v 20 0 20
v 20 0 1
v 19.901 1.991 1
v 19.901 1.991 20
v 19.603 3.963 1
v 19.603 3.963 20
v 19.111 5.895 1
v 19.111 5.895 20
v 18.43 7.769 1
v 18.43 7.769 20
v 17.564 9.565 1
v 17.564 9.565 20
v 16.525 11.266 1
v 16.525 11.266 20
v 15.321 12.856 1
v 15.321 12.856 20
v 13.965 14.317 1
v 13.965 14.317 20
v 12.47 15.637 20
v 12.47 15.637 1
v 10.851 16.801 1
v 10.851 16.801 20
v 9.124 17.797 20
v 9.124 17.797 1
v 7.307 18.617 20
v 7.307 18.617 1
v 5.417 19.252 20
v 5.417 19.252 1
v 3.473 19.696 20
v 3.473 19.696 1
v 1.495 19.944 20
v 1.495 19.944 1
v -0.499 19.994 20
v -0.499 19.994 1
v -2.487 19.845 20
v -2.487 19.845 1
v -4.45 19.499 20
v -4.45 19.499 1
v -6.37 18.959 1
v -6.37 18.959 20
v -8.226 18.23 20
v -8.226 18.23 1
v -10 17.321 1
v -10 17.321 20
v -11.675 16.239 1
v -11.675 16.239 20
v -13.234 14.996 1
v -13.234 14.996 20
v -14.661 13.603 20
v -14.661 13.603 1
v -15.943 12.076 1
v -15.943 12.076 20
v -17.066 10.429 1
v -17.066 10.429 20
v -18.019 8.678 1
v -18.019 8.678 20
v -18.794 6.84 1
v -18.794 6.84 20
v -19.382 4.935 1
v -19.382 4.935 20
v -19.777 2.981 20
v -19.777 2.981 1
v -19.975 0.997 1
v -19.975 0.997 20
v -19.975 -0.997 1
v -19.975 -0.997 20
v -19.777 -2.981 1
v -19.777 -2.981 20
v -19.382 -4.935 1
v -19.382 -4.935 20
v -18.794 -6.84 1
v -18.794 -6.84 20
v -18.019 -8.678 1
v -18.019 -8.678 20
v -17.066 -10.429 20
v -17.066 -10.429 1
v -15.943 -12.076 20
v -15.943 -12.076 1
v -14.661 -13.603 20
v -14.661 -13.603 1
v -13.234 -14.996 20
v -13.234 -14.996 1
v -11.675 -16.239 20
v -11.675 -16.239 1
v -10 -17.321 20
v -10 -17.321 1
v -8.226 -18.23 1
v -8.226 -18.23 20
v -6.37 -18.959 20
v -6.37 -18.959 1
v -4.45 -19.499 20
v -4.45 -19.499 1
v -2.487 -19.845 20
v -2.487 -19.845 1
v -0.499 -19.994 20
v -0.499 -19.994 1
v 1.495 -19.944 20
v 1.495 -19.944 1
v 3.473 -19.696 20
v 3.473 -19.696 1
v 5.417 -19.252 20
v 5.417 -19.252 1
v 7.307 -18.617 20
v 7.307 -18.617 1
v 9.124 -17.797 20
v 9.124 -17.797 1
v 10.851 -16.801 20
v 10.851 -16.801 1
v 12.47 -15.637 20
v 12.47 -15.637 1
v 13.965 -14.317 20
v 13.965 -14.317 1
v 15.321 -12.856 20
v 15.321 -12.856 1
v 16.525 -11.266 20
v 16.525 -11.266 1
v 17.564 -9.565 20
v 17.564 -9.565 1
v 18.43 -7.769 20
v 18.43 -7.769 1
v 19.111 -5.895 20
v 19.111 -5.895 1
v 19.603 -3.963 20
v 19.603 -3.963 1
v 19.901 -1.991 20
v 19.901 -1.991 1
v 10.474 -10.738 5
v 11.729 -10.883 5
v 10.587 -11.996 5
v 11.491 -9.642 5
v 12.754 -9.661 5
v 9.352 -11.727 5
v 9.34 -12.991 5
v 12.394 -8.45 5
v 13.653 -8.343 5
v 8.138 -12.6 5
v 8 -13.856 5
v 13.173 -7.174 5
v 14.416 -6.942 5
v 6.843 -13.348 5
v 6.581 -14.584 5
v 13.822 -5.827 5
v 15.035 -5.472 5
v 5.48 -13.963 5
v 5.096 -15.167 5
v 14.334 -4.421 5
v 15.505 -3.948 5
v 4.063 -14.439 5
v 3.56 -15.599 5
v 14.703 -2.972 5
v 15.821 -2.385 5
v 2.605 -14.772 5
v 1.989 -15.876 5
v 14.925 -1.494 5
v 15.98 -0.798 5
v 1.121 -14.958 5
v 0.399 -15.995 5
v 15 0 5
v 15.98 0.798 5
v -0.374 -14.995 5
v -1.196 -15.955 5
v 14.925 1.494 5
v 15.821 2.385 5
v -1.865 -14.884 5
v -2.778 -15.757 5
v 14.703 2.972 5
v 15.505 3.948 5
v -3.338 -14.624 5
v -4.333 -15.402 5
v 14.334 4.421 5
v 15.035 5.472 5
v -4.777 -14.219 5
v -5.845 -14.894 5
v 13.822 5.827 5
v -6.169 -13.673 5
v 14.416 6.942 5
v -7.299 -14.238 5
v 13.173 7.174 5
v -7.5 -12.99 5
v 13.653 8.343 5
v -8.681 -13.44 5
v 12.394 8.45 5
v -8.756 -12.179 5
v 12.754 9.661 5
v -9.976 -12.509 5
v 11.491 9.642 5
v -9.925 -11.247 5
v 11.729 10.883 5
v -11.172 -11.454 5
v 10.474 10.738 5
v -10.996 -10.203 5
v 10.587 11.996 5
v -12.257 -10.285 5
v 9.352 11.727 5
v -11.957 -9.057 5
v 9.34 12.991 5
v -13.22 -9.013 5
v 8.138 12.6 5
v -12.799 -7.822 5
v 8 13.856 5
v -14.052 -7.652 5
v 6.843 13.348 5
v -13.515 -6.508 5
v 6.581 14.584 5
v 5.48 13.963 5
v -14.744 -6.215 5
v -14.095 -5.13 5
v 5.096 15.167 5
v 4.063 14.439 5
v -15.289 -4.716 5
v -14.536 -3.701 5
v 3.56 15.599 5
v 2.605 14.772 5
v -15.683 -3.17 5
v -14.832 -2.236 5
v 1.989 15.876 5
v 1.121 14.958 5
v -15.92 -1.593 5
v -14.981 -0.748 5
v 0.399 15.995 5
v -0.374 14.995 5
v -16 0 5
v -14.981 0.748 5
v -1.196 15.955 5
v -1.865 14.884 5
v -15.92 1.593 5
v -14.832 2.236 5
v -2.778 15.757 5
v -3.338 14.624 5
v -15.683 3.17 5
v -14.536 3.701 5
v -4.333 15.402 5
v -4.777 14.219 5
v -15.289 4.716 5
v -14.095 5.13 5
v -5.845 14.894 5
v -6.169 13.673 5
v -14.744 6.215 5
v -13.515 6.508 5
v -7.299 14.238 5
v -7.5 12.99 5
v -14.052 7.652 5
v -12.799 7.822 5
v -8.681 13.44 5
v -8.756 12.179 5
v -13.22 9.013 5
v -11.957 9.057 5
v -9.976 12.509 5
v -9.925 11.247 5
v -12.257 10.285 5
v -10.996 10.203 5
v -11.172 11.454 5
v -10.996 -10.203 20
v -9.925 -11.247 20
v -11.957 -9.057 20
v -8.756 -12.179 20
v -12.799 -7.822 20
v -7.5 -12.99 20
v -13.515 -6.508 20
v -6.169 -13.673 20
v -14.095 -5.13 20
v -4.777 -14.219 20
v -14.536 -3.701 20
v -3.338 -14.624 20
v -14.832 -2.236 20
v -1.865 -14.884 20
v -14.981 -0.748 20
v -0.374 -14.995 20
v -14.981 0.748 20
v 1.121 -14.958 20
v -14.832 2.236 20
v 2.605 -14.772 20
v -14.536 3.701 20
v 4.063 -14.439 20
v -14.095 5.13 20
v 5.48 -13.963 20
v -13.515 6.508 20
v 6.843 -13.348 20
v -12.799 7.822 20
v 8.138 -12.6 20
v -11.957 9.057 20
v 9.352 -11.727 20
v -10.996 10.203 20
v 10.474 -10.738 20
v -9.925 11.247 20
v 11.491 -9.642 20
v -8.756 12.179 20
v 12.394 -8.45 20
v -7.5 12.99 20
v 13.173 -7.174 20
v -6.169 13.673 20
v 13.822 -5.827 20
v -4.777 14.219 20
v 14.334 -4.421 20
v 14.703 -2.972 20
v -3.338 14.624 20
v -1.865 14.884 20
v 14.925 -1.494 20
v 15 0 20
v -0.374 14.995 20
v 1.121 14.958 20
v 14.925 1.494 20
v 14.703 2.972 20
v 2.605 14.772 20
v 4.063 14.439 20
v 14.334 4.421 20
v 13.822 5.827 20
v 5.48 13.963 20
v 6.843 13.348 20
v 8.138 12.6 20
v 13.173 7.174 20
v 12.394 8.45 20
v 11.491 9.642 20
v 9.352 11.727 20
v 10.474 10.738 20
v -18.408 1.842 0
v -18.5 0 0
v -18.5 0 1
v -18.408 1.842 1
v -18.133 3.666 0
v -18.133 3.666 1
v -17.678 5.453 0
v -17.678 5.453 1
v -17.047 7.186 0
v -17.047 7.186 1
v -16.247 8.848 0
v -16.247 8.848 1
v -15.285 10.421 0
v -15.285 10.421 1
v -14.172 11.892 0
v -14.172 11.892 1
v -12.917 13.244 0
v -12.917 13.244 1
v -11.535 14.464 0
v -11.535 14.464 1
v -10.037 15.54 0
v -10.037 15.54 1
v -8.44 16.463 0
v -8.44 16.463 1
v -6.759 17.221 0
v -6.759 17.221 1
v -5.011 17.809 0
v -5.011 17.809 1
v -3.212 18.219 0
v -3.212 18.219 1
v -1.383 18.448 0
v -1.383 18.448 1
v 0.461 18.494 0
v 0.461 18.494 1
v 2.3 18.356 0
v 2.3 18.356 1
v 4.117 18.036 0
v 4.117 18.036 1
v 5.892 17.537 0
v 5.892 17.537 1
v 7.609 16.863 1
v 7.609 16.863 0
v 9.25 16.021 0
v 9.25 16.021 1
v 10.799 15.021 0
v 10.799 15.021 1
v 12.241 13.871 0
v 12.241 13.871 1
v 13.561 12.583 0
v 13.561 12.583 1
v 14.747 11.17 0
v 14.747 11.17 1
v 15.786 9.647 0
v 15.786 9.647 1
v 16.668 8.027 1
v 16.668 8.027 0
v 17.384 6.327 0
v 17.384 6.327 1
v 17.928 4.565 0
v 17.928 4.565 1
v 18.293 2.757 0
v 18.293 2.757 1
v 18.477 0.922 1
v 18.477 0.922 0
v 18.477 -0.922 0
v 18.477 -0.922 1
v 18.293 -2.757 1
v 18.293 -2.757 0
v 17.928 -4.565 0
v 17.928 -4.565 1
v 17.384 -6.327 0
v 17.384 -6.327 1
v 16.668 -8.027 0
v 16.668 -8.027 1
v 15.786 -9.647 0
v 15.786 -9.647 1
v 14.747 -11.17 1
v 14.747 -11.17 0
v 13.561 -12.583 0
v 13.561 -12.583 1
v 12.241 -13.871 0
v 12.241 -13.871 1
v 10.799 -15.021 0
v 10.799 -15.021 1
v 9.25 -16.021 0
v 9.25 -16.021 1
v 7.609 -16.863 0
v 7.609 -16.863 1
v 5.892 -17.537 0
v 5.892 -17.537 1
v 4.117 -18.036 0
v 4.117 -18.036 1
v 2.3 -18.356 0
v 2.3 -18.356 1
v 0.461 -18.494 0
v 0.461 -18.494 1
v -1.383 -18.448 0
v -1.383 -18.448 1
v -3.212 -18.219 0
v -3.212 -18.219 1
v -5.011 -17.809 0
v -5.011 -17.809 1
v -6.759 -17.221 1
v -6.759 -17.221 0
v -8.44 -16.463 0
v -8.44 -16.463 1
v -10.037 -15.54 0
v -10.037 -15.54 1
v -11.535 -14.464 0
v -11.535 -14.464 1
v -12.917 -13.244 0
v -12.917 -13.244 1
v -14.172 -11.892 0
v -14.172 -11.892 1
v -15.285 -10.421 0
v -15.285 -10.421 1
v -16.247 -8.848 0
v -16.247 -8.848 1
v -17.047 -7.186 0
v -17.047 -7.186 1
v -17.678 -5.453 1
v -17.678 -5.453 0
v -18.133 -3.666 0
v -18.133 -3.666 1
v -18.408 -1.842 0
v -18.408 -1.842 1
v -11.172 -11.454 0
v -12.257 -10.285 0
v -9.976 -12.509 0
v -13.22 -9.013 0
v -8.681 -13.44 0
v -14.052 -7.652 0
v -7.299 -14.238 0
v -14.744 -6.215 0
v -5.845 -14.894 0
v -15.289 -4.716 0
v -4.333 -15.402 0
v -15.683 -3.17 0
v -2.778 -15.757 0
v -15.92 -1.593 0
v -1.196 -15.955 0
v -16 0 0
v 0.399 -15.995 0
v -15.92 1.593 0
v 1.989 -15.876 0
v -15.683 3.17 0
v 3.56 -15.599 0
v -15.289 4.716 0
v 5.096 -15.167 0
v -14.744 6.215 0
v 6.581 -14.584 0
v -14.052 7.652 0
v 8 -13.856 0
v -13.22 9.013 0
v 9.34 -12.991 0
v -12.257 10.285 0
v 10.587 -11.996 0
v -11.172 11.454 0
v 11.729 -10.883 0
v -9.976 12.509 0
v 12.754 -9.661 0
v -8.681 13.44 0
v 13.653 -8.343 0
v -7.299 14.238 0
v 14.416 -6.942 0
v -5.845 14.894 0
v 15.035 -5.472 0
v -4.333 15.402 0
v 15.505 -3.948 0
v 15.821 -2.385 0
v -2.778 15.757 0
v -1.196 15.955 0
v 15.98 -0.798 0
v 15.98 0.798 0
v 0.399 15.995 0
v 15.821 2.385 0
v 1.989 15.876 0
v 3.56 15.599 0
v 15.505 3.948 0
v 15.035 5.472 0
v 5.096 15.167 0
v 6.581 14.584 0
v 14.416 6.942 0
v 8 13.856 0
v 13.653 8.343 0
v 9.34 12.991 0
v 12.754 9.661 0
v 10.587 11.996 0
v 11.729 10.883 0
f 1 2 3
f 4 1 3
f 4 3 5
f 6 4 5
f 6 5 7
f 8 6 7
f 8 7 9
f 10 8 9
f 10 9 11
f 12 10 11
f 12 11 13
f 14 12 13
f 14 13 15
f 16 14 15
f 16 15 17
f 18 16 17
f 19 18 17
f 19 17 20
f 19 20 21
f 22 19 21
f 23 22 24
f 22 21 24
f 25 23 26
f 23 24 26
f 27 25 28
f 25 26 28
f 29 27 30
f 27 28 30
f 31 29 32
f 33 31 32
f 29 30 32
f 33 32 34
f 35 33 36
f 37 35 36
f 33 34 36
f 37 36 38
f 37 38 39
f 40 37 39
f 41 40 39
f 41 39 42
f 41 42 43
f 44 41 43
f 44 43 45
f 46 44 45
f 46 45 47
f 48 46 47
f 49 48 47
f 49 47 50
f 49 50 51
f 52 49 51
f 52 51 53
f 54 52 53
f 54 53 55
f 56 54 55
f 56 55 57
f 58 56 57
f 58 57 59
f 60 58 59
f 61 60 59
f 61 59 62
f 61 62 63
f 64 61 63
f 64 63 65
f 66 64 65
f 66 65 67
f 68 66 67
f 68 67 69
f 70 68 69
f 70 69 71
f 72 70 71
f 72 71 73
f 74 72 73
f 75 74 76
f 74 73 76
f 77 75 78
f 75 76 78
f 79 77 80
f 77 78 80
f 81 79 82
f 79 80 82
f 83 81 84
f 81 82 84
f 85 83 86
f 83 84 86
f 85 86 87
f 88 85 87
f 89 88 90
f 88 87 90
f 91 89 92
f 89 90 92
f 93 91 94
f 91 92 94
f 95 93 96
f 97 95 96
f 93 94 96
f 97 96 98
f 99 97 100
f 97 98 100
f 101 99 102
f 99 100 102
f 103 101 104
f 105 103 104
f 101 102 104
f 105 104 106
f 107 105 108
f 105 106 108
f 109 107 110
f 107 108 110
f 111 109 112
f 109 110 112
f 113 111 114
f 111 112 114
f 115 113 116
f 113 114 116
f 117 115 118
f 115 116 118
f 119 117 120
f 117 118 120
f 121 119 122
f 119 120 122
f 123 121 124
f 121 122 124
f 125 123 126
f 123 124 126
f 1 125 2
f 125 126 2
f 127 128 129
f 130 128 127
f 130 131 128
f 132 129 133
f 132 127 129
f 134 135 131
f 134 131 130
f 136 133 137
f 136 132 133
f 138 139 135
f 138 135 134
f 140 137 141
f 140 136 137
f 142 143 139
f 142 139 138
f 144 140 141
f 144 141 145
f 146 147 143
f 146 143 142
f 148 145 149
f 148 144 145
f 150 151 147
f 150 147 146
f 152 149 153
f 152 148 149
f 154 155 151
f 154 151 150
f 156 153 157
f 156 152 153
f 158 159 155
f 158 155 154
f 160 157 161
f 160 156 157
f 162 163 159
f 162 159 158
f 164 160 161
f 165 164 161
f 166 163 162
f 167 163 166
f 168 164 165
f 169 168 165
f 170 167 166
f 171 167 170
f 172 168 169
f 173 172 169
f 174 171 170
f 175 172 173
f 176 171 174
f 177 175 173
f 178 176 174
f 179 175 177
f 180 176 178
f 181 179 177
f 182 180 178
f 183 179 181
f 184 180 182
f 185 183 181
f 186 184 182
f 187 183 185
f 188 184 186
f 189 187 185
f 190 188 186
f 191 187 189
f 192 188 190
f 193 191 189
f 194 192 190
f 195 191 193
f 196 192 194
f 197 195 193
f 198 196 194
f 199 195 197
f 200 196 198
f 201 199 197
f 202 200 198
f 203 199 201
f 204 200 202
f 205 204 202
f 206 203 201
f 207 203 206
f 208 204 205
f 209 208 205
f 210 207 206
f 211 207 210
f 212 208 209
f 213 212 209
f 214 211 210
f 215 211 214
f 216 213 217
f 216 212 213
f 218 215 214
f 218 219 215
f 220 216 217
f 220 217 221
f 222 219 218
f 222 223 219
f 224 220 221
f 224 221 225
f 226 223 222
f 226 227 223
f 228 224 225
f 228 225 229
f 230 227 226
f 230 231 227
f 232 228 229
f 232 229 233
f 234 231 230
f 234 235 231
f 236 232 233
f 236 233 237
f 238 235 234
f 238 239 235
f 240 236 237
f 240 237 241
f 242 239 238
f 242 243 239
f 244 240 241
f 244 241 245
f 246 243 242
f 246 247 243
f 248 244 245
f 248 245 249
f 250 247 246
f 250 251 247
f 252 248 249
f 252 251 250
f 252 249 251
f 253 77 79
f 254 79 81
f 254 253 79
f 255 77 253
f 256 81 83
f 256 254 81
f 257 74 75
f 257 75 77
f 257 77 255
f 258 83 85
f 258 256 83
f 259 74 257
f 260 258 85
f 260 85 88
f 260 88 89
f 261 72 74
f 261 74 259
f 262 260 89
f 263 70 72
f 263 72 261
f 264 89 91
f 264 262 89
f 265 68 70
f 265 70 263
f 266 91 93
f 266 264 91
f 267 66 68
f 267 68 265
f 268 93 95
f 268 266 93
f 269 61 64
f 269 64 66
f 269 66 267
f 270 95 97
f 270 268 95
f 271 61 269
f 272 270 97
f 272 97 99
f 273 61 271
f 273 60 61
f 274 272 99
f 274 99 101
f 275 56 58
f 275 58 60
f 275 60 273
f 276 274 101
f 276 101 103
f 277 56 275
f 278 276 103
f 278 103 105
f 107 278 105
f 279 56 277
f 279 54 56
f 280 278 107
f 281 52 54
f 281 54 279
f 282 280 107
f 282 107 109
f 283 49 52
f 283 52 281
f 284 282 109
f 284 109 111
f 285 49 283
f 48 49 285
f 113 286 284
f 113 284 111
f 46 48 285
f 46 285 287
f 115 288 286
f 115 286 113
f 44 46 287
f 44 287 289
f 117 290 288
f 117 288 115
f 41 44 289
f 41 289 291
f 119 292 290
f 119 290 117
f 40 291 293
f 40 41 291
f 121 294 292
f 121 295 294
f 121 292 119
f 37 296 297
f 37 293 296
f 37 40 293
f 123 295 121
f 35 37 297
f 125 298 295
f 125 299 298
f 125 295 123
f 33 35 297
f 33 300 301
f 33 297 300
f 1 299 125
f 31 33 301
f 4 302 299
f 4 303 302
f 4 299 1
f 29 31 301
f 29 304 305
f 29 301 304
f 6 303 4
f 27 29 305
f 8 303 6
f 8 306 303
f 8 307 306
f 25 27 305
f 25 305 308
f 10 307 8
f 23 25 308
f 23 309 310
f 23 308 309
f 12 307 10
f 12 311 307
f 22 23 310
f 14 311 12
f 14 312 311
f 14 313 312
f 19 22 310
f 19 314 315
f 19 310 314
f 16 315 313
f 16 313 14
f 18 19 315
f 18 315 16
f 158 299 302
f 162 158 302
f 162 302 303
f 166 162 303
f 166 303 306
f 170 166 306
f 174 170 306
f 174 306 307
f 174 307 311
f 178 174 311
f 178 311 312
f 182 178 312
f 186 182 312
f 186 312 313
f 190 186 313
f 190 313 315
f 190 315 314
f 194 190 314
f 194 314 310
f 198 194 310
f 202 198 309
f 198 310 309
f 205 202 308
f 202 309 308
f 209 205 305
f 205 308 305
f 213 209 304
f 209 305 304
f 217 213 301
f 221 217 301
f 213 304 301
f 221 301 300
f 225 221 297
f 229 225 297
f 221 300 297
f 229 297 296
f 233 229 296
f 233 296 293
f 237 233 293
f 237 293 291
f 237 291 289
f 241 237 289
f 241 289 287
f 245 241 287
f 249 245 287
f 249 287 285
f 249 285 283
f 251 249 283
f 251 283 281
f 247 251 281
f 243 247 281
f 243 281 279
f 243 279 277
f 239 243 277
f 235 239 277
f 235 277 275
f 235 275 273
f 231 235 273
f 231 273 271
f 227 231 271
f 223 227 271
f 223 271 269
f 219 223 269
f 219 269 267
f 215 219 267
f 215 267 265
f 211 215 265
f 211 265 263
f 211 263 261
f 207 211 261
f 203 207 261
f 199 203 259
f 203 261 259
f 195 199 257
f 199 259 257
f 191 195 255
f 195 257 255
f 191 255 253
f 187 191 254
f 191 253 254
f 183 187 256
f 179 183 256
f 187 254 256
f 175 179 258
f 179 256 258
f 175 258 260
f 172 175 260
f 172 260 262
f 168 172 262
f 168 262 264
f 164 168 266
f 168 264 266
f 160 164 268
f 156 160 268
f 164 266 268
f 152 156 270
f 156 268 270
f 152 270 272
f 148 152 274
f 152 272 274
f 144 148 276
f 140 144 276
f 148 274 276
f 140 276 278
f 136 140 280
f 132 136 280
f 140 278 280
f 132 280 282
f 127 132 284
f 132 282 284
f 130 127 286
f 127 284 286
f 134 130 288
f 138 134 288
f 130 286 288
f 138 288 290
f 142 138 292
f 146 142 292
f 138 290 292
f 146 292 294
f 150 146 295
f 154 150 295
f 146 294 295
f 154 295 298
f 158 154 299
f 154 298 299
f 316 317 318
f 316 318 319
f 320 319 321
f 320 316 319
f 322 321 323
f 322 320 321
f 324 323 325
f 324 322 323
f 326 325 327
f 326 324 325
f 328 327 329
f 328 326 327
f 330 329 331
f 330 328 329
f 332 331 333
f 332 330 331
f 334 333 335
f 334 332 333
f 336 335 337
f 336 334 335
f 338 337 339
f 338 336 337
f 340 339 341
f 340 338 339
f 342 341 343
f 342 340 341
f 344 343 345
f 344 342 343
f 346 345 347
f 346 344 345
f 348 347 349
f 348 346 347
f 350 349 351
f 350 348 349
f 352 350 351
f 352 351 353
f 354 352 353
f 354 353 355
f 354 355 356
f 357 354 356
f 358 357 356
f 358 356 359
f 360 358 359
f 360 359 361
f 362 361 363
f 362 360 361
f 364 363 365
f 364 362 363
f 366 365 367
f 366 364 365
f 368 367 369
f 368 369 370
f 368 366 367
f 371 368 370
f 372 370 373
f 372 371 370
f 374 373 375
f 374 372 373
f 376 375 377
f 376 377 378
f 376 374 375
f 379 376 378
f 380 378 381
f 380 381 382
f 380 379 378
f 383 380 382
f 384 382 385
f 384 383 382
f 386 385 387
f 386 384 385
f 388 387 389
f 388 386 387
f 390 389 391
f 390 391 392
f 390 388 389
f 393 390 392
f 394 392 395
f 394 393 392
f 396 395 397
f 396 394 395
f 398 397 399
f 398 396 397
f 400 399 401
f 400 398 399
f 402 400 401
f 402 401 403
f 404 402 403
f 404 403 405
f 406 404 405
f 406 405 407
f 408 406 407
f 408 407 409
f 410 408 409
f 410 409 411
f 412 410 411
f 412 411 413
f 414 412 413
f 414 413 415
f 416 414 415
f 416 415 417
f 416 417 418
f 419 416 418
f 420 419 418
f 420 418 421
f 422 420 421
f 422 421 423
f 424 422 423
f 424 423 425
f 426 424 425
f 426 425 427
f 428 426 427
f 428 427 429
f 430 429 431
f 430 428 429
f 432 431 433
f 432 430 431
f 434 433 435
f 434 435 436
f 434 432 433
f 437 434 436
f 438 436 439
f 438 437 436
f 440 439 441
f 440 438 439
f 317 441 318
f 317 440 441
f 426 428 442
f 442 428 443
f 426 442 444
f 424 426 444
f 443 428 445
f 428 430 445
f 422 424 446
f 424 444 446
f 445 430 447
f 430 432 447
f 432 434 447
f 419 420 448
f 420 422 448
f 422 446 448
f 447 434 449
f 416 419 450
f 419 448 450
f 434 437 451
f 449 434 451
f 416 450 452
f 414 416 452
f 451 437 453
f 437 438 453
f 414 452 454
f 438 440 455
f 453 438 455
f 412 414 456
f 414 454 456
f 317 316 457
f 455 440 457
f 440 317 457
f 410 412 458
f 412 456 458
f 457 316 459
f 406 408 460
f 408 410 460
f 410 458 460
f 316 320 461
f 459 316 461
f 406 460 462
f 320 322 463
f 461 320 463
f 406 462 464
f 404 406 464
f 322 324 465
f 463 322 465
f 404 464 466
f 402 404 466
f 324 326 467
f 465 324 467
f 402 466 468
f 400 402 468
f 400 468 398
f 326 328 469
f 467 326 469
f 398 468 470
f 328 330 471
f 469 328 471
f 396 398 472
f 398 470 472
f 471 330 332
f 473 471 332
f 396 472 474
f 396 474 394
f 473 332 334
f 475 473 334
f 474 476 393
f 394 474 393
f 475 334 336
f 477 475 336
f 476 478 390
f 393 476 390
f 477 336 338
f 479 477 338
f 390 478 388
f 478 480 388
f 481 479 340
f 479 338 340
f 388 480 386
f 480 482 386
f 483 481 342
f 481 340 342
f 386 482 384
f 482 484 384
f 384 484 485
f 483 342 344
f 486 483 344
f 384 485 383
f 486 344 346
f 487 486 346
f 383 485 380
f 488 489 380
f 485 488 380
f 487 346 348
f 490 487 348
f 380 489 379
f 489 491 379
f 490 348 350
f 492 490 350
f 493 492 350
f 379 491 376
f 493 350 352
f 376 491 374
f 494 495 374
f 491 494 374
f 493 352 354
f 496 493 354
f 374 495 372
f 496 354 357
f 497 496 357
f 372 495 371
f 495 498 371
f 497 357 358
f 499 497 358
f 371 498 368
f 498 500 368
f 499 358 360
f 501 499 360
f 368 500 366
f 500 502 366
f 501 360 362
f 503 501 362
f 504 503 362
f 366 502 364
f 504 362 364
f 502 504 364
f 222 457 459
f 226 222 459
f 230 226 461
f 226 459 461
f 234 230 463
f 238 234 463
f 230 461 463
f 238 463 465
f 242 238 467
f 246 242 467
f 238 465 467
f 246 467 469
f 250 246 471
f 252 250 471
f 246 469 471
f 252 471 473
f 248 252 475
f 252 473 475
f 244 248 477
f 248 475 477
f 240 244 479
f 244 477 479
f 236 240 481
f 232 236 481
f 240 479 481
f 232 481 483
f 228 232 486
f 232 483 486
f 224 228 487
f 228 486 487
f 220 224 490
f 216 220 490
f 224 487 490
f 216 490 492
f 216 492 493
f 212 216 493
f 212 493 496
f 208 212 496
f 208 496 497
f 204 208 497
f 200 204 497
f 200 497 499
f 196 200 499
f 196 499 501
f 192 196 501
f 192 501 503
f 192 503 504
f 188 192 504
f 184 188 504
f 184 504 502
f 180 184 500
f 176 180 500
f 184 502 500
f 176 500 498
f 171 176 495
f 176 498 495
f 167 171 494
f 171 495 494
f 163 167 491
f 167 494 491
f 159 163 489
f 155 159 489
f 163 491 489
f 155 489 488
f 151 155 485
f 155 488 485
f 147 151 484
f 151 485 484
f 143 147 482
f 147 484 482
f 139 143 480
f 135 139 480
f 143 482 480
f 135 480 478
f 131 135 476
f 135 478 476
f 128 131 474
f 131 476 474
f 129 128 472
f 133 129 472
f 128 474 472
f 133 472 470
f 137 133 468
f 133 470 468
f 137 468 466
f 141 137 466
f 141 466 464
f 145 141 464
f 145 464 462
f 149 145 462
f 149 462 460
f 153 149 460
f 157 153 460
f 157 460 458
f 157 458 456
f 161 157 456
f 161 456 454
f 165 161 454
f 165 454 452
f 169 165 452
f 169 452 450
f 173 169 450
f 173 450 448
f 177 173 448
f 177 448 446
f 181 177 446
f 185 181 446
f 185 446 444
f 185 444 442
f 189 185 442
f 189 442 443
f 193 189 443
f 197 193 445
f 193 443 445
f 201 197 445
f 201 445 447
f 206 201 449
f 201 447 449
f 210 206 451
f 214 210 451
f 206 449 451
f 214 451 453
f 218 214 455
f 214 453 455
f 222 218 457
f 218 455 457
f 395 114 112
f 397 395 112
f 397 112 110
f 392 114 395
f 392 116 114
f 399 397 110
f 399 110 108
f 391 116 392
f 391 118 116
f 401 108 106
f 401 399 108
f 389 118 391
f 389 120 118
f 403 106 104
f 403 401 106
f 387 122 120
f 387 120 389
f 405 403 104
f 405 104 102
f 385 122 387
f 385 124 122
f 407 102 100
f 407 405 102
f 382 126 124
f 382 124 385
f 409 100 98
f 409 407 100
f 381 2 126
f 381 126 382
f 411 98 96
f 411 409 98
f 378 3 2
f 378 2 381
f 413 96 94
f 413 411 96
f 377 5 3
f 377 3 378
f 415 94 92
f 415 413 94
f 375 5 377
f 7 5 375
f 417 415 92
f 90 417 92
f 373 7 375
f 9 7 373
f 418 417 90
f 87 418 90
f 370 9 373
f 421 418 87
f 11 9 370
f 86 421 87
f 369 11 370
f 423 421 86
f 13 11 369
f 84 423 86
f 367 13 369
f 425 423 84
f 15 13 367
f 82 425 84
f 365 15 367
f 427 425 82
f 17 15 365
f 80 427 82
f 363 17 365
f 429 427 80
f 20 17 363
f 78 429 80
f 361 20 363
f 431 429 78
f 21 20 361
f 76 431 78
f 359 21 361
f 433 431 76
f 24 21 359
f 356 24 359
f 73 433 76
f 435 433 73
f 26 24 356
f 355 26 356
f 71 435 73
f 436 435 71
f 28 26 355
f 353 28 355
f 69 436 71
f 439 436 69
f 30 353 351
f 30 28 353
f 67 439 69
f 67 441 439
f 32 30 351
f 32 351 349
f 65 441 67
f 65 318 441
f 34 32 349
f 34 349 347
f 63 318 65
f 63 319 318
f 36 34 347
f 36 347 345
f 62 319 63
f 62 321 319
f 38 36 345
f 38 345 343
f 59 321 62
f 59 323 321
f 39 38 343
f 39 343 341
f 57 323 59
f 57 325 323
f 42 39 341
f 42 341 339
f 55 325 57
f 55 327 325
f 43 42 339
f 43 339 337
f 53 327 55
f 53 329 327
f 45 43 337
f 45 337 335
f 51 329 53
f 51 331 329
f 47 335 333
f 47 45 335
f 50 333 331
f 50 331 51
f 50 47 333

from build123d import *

# Parameters (mm, degrees)
SKETCH_1_R          = 20
EXTRUDE_1_DEPTH     = 20
SKETCH_4_R          = 20
SKETCH_4_R_2        = 18.5
CUT_EXTRUDE_3_DEPTH = 1
SKETCH_3_R          = 16
CUT_EXTRUDE_2_DEPTH = 5
SKETCH_6_R          = 15
CUT_EXTRUDE_4_DEPTH = 21


with BuildPart() as part:
    # ｽｹｯﾁ1 → ﾎﾞｽ - 押し出し1 (new body)
    with BuildSketch(Plane.XY):
        Circle(SKETCH_1_R)
    extrude(amount=EXTRUDE_1_DEPTH)

    # ｽｹｯﾁ4 → ｶｯﾄ - 押し出し3 (cut)
    with BuildSketch(Plane(origin=(0, 0, 0), x_dir=(-1, 0, 0), z_dir=(0, 0, -1))):
        Circle(SKETCH_4_R)
        Circle(SKETCH_4_R_2, mode=Mode.SUBTRACT)
    extrude(amount=-CUT_EXTRUDE_3_DEPTH, mode=Mode.SUBTRACT)

    # ｽｹｯﾁ3 → ｶｯﾄ - 押し出し2 (cut)
    with BuildSketch(Plane(origin=(0, 0, 0), x_dir=(-1, 0, 0), z_dir=(0, 0, -1))):
        Circle(SKETCH_3_R)
    extrude(amount=-CUT_EXTRUDE_2_DEPTH, mode=Mode.SUBTRACT)

    # ｽｹｯﾁ6 → ｶｯﾄ - 押し出し4 (cut, through all)
    with BuildSketch(Plane.XY.offset(20)):
        Circle(SKETCH_6_R)
    extrude(amount=-CUT_EXTRUDE_4_DEPTH, mode=Mode.SUBTRACT)


solid = part.part
